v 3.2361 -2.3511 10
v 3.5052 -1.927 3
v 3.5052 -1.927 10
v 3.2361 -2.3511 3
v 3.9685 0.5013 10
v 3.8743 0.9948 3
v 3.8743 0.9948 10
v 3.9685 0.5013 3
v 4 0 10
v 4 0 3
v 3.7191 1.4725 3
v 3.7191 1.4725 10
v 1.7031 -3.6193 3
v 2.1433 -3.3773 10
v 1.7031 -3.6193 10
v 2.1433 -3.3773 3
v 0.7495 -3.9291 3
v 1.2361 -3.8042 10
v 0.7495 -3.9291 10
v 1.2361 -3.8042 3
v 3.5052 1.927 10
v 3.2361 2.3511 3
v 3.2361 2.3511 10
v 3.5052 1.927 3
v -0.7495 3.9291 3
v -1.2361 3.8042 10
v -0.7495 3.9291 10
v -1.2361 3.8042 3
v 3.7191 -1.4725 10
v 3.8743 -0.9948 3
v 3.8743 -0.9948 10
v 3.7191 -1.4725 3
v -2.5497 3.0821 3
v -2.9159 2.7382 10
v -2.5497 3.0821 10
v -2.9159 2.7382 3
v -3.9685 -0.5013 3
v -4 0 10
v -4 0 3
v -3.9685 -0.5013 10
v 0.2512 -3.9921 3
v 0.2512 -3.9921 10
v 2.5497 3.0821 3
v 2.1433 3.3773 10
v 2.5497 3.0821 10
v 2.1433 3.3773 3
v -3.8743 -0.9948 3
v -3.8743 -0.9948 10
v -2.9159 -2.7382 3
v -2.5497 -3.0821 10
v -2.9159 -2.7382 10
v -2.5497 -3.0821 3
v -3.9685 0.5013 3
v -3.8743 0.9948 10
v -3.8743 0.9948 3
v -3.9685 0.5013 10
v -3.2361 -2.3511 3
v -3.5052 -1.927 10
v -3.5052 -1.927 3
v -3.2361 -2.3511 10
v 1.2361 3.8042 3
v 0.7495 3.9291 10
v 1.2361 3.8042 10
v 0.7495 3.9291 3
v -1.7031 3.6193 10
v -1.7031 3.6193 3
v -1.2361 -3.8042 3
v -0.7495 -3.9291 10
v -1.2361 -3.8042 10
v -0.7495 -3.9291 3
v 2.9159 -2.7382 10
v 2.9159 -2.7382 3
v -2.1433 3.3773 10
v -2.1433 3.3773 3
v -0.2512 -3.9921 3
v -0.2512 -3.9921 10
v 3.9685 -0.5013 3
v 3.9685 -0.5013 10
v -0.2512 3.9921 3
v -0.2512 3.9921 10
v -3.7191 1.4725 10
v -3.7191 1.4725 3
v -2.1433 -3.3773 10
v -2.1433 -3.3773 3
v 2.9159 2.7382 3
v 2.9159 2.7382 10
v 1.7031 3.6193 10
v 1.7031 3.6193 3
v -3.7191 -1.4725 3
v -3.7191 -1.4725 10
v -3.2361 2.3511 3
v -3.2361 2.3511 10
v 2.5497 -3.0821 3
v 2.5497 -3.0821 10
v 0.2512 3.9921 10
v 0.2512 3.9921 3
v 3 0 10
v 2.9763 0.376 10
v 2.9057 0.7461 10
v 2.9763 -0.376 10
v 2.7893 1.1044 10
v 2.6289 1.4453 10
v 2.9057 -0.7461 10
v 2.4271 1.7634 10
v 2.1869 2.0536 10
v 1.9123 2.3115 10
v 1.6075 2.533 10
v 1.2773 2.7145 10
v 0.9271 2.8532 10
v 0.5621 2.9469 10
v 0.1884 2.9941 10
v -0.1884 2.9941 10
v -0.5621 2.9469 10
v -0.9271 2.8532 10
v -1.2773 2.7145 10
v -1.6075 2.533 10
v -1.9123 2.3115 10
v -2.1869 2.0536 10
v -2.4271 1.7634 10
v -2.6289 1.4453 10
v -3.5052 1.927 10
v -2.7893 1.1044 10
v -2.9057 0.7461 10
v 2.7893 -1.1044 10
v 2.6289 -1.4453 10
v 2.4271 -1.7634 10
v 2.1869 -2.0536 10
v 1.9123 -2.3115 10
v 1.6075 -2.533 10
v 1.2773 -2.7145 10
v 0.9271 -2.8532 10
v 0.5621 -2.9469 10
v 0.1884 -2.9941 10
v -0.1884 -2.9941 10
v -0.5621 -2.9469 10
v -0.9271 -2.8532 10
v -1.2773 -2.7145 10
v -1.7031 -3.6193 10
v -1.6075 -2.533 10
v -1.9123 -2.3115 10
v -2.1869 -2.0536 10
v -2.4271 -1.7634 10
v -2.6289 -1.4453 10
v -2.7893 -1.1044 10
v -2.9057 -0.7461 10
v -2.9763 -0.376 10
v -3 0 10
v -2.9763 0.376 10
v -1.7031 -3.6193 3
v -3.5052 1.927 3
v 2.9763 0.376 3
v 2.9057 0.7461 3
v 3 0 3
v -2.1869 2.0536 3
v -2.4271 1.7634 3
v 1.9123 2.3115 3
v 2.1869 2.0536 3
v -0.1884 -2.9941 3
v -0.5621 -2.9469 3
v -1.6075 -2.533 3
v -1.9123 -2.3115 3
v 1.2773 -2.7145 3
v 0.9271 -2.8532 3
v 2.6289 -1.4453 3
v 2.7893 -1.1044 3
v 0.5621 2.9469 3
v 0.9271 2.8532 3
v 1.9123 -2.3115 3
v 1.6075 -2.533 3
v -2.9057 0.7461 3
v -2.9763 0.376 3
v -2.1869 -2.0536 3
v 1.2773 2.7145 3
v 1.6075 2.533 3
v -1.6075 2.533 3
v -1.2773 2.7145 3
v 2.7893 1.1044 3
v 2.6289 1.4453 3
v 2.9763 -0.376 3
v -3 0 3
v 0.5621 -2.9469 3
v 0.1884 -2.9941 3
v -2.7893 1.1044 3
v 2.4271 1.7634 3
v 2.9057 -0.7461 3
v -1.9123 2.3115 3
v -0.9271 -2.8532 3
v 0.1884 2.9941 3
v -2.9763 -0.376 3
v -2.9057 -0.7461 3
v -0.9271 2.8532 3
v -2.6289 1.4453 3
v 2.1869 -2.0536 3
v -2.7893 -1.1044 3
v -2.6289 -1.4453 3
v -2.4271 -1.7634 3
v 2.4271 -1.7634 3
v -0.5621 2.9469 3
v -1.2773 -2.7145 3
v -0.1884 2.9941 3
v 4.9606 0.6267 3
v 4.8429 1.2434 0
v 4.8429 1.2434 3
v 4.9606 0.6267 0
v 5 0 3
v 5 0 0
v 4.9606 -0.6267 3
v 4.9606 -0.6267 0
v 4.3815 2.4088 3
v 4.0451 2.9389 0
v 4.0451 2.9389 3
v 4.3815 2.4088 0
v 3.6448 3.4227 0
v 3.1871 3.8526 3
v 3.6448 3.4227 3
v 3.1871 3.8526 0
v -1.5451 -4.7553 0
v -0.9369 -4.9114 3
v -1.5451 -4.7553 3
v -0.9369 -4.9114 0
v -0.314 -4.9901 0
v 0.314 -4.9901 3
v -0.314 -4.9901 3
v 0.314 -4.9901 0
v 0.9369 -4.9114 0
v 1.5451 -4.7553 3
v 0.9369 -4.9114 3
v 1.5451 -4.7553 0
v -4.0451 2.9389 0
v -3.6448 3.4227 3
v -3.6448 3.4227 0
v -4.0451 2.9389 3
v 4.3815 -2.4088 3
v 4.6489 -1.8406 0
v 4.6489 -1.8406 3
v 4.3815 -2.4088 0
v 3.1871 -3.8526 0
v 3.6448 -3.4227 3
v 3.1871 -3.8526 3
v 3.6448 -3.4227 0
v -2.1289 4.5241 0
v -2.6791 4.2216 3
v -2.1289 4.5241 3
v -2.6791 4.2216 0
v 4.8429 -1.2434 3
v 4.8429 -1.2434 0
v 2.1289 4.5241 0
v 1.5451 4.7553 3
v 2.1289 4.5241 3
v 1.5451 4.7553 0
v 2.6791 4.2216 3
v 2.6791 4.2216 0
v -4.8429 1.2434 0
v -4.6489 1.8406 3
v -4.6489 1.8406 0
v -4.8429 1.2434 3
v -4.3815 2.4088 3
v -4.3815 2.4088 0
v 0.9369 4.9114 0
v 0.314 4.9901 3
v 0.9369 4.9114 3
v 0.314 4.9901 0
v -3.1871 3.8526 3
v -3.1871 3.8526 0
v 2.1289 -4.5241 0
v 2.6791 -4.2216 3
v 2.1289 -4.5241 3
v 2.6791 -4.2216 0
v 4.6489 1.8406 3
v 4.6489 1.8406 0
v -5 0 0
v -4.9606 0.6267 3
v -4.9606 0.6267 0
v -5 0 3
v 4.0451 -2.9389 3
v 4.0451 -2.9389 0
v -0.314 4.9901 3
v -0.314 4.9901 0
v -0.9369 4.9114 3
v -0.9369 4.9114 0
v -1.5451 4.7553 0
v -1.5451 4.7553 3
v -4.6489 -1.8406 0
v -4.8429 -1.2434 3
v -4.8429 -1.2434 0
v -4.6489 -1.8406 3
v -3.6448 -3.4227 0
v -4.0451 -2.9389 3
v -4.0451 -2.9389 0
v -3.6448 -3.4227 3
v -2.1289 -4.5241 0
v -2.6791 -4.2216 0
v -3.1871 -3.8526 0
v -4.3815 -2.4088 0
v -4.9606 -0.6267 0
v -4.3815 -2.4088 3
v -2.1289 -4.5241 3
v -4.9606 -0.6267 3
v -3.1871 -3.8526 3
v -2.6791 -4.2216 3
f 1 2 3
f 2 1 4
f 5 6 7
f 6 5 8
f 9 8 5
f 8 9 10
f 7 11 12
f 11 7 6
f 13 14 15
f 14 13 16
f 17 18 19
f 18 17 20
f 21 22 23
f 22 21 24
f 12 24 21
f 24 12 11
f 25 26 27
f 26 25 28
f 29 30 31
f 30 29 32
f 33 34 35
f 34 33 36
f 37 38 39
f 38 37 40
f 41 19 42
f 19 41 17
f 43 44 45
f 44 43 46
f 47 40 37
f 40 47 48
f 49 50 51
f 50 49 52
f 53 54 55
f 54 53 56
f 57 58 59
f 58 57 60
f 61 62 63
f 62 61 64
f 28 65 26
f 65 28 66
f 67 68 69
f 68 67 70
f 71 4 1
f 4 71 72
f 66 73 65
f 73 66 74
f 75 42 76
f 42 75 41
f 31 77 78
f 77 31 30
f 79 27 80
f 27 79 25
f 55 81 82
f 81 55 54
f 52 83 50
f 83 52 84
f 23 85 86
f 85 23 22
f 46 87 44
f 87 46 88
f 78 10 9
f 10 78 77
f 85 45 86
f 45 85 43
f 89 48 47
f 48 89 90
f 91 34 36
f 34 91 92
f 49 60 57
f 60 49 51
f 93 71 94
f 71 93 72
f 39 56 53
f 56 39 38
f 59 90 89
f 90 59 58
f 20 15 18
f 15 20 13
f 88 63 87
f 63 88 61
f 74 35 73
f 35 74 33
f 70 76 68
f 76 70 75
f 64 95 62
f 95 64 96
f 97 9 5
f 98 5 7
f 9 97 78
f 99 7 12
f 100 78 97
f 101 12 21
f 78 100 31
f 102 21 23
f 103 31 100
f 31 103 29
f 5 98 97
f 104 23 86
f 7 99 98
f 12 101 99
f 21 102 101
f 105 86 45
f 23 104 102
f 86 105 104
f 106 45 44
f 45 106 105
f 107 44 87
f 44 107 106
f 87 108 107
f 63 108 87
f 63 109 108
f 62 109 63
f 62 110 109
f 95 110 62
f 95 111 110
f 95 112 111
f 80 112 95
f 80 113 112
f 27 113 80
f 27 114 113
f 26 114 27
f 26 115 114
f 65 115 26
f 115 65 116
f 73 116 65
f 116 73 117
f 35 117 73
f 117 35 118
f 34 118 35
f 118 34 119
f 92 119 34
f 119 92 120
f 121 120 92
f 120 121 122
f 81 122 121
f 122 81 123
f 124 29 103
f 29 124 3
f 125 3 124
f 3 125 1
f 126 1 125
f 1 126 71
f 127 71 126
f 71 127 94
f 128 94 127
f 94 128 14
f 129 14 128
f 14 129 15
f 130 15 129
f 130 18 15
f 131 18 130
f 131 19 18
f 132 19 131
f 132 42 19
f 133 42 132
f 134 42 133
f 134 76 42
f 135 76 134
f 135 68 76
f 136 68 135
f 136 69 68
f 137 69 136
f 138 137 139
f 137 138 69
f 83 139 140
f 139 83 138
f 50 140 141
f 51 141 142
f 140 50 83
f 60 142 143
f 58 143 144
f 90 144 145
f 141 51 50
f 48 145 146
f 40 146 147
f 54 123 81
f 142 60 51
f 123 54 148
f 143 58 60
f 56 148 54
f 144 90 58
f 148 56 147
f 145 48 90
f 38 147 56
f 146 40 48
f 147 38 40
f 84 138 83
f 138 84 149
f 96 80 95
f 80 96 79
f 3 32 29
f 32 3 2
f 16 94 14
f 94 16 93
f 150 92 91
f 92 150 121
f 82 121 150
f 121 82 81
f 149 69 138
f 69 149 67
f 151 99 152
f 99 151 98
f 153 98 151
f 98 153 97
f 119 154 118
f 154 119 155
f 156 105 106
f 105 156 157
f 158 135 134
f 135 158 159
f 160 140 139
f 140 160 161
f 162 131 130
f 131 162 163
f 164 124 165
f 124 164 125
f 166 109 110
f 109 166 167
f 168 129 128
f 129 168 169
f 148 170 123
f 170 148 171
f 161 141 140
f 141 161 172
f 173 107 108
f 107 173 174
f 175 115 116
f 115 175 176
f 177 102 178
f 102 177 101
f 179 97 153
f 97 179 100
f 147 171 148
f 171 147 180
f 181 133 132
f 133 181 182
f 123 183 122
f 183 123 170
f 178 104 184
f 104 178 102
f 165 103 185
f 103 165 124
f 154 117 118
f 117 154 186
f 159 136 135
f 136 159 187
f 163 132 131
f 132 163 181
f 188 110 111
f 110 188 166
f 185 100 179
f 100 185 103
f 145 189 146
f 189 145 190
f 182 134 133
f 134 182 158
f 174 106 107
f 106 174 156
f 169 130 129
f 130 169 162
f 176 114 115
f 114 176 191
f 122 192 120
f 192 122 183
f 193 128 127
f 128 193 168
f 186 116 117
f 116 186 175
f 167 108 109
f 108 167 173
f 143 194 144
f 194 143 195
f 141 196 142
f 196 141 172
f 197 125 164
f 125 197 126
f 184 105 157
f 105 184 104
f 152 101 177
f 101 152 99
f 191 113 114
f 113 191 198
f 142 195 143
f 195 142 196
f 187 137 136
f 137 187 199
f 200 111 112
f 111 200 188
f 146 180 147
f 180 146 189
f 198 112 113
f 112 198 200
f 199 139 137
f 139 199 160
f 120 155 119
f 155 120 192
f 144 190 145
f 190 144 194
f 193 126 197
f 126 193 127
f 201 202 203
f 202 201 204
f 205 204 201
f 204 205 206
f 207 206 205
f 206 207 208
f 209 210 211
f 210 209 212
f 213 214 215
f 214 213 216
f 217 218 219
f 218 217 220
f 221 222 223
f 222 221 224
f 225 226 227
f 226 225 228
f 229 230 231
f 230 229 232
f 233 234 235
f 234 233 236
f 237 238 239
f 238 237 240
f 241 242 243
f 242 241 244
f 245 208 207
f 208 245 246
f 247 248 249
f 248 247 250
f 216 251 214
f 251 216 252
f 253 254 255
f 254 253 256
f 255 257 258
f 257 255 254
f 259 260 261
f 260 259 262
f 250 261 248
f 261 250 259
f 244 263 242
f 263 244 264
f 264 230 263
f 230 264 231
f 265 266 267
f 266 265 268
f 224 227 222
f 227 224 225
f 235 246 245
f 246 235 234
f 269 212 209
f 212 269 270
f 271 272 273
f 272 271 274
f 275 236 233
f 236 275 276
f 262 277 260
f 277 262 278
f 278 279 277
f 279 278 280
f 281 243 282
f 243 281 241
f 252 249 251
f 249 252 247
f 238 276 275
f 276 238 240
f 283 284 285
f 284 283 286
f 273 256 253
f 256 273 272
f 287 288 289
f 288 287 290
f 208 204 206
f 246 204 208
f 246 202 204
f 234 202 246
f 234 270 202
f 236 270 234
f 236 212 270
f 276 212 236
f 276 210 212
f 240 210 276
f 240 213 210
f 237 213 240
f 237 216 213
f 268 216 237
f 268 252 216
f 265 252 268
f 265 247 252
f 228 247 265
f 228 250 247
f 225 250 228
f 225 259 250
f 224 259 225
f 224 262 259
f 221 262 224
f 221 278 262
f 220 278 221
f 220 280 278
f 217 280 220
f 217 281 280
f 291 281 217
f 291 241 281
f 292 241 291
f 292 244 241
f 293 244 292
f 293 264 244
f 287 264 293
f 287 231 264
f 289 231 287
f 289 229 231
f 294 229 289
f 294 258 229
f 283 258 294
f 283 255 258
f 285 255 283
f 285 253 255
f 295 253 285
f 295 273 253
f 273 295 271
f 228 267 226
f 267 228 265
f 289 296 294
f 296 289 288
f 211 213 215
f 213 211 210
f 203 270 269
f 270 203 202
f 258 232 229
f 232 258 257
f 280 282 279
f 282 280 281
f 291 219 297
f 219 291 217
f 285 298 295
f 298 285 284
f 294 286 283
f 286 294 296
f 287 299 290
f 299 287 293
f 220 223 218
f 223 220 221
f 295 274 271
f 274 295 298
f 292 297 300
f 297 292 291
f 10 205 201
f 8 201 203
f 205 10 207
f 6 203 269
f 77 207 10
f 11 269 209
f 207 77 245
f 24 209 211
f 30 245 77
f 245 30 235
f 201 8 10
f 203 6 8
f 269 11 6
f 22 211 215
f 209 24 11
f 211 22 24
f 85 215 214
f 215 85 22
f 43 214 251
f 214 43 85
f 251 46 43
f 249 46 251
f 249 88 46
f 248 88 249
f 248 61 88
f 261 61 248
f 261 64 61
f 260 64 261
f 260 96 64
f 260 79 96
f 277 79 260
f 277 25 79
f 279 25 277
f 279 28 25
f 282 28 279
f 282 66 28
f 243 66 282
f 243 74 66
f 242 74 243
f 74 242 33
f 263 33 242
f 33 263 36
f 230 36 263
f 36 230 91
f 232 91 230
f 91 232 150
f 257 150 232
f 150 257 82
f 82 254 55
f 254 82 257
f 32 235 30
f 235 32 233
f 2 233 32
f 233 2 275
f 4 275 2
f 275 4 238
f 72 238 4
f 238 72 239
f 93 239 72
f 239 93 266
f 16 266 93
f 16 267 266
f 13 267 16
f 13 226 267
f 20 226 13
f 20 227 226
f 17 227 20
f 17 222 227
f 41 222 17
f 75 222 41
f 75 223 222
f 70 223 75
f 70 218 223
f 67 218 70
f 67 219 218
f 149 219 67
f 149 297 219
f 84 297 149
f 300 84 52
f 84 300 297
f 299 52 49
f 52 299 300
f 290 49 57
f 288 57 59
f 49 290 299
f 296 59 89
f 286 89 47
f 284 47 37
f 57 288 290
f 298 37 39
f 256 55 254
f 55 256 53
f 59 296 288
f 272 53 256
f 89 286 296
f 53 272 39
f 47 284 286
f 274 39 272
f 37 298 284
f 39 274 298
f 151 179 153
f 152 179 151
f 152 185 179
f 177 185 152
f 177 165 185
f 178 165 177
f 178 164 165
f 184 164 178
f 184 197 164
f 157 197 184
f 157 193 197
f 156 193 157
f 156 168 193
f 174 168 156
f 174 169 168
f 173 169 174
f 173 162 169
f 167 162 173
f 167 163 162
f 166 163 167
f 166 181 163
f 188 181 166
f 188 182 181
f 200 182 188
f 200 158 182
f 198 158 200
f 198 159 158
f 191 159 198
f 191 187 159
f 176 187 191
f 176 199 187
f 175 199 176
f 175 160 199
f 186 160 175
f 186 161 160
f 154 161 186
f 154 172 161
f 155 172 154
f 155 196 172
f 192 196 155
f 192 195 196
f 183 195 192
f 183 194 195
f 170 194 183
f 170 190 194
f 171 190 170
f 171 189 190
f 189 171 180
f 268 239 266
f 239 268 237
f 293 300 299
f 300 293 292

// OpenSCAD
//shaft diameter
shaft_diameter=8;

//shaft_ length
shaft_length=7;

//shaft wall thickness
shaft_wall_thickness=1;

//cap diameter
cap_diameter=10;

//cap hight
cap_hight=3;

//resolution
$fn=50; //[100,300,500]
union(){
  cylinder ( cap_hight, d = cap_diameter );
  translate([0,0,cap_hight-.1])difference(){
   cylinder( shaft_length+.1, d=shaft_diameter);
   cylinder ( shaft_length+.2,d=(shaft_diameter-(2*shaft_wall_thickness)));
  }
}
